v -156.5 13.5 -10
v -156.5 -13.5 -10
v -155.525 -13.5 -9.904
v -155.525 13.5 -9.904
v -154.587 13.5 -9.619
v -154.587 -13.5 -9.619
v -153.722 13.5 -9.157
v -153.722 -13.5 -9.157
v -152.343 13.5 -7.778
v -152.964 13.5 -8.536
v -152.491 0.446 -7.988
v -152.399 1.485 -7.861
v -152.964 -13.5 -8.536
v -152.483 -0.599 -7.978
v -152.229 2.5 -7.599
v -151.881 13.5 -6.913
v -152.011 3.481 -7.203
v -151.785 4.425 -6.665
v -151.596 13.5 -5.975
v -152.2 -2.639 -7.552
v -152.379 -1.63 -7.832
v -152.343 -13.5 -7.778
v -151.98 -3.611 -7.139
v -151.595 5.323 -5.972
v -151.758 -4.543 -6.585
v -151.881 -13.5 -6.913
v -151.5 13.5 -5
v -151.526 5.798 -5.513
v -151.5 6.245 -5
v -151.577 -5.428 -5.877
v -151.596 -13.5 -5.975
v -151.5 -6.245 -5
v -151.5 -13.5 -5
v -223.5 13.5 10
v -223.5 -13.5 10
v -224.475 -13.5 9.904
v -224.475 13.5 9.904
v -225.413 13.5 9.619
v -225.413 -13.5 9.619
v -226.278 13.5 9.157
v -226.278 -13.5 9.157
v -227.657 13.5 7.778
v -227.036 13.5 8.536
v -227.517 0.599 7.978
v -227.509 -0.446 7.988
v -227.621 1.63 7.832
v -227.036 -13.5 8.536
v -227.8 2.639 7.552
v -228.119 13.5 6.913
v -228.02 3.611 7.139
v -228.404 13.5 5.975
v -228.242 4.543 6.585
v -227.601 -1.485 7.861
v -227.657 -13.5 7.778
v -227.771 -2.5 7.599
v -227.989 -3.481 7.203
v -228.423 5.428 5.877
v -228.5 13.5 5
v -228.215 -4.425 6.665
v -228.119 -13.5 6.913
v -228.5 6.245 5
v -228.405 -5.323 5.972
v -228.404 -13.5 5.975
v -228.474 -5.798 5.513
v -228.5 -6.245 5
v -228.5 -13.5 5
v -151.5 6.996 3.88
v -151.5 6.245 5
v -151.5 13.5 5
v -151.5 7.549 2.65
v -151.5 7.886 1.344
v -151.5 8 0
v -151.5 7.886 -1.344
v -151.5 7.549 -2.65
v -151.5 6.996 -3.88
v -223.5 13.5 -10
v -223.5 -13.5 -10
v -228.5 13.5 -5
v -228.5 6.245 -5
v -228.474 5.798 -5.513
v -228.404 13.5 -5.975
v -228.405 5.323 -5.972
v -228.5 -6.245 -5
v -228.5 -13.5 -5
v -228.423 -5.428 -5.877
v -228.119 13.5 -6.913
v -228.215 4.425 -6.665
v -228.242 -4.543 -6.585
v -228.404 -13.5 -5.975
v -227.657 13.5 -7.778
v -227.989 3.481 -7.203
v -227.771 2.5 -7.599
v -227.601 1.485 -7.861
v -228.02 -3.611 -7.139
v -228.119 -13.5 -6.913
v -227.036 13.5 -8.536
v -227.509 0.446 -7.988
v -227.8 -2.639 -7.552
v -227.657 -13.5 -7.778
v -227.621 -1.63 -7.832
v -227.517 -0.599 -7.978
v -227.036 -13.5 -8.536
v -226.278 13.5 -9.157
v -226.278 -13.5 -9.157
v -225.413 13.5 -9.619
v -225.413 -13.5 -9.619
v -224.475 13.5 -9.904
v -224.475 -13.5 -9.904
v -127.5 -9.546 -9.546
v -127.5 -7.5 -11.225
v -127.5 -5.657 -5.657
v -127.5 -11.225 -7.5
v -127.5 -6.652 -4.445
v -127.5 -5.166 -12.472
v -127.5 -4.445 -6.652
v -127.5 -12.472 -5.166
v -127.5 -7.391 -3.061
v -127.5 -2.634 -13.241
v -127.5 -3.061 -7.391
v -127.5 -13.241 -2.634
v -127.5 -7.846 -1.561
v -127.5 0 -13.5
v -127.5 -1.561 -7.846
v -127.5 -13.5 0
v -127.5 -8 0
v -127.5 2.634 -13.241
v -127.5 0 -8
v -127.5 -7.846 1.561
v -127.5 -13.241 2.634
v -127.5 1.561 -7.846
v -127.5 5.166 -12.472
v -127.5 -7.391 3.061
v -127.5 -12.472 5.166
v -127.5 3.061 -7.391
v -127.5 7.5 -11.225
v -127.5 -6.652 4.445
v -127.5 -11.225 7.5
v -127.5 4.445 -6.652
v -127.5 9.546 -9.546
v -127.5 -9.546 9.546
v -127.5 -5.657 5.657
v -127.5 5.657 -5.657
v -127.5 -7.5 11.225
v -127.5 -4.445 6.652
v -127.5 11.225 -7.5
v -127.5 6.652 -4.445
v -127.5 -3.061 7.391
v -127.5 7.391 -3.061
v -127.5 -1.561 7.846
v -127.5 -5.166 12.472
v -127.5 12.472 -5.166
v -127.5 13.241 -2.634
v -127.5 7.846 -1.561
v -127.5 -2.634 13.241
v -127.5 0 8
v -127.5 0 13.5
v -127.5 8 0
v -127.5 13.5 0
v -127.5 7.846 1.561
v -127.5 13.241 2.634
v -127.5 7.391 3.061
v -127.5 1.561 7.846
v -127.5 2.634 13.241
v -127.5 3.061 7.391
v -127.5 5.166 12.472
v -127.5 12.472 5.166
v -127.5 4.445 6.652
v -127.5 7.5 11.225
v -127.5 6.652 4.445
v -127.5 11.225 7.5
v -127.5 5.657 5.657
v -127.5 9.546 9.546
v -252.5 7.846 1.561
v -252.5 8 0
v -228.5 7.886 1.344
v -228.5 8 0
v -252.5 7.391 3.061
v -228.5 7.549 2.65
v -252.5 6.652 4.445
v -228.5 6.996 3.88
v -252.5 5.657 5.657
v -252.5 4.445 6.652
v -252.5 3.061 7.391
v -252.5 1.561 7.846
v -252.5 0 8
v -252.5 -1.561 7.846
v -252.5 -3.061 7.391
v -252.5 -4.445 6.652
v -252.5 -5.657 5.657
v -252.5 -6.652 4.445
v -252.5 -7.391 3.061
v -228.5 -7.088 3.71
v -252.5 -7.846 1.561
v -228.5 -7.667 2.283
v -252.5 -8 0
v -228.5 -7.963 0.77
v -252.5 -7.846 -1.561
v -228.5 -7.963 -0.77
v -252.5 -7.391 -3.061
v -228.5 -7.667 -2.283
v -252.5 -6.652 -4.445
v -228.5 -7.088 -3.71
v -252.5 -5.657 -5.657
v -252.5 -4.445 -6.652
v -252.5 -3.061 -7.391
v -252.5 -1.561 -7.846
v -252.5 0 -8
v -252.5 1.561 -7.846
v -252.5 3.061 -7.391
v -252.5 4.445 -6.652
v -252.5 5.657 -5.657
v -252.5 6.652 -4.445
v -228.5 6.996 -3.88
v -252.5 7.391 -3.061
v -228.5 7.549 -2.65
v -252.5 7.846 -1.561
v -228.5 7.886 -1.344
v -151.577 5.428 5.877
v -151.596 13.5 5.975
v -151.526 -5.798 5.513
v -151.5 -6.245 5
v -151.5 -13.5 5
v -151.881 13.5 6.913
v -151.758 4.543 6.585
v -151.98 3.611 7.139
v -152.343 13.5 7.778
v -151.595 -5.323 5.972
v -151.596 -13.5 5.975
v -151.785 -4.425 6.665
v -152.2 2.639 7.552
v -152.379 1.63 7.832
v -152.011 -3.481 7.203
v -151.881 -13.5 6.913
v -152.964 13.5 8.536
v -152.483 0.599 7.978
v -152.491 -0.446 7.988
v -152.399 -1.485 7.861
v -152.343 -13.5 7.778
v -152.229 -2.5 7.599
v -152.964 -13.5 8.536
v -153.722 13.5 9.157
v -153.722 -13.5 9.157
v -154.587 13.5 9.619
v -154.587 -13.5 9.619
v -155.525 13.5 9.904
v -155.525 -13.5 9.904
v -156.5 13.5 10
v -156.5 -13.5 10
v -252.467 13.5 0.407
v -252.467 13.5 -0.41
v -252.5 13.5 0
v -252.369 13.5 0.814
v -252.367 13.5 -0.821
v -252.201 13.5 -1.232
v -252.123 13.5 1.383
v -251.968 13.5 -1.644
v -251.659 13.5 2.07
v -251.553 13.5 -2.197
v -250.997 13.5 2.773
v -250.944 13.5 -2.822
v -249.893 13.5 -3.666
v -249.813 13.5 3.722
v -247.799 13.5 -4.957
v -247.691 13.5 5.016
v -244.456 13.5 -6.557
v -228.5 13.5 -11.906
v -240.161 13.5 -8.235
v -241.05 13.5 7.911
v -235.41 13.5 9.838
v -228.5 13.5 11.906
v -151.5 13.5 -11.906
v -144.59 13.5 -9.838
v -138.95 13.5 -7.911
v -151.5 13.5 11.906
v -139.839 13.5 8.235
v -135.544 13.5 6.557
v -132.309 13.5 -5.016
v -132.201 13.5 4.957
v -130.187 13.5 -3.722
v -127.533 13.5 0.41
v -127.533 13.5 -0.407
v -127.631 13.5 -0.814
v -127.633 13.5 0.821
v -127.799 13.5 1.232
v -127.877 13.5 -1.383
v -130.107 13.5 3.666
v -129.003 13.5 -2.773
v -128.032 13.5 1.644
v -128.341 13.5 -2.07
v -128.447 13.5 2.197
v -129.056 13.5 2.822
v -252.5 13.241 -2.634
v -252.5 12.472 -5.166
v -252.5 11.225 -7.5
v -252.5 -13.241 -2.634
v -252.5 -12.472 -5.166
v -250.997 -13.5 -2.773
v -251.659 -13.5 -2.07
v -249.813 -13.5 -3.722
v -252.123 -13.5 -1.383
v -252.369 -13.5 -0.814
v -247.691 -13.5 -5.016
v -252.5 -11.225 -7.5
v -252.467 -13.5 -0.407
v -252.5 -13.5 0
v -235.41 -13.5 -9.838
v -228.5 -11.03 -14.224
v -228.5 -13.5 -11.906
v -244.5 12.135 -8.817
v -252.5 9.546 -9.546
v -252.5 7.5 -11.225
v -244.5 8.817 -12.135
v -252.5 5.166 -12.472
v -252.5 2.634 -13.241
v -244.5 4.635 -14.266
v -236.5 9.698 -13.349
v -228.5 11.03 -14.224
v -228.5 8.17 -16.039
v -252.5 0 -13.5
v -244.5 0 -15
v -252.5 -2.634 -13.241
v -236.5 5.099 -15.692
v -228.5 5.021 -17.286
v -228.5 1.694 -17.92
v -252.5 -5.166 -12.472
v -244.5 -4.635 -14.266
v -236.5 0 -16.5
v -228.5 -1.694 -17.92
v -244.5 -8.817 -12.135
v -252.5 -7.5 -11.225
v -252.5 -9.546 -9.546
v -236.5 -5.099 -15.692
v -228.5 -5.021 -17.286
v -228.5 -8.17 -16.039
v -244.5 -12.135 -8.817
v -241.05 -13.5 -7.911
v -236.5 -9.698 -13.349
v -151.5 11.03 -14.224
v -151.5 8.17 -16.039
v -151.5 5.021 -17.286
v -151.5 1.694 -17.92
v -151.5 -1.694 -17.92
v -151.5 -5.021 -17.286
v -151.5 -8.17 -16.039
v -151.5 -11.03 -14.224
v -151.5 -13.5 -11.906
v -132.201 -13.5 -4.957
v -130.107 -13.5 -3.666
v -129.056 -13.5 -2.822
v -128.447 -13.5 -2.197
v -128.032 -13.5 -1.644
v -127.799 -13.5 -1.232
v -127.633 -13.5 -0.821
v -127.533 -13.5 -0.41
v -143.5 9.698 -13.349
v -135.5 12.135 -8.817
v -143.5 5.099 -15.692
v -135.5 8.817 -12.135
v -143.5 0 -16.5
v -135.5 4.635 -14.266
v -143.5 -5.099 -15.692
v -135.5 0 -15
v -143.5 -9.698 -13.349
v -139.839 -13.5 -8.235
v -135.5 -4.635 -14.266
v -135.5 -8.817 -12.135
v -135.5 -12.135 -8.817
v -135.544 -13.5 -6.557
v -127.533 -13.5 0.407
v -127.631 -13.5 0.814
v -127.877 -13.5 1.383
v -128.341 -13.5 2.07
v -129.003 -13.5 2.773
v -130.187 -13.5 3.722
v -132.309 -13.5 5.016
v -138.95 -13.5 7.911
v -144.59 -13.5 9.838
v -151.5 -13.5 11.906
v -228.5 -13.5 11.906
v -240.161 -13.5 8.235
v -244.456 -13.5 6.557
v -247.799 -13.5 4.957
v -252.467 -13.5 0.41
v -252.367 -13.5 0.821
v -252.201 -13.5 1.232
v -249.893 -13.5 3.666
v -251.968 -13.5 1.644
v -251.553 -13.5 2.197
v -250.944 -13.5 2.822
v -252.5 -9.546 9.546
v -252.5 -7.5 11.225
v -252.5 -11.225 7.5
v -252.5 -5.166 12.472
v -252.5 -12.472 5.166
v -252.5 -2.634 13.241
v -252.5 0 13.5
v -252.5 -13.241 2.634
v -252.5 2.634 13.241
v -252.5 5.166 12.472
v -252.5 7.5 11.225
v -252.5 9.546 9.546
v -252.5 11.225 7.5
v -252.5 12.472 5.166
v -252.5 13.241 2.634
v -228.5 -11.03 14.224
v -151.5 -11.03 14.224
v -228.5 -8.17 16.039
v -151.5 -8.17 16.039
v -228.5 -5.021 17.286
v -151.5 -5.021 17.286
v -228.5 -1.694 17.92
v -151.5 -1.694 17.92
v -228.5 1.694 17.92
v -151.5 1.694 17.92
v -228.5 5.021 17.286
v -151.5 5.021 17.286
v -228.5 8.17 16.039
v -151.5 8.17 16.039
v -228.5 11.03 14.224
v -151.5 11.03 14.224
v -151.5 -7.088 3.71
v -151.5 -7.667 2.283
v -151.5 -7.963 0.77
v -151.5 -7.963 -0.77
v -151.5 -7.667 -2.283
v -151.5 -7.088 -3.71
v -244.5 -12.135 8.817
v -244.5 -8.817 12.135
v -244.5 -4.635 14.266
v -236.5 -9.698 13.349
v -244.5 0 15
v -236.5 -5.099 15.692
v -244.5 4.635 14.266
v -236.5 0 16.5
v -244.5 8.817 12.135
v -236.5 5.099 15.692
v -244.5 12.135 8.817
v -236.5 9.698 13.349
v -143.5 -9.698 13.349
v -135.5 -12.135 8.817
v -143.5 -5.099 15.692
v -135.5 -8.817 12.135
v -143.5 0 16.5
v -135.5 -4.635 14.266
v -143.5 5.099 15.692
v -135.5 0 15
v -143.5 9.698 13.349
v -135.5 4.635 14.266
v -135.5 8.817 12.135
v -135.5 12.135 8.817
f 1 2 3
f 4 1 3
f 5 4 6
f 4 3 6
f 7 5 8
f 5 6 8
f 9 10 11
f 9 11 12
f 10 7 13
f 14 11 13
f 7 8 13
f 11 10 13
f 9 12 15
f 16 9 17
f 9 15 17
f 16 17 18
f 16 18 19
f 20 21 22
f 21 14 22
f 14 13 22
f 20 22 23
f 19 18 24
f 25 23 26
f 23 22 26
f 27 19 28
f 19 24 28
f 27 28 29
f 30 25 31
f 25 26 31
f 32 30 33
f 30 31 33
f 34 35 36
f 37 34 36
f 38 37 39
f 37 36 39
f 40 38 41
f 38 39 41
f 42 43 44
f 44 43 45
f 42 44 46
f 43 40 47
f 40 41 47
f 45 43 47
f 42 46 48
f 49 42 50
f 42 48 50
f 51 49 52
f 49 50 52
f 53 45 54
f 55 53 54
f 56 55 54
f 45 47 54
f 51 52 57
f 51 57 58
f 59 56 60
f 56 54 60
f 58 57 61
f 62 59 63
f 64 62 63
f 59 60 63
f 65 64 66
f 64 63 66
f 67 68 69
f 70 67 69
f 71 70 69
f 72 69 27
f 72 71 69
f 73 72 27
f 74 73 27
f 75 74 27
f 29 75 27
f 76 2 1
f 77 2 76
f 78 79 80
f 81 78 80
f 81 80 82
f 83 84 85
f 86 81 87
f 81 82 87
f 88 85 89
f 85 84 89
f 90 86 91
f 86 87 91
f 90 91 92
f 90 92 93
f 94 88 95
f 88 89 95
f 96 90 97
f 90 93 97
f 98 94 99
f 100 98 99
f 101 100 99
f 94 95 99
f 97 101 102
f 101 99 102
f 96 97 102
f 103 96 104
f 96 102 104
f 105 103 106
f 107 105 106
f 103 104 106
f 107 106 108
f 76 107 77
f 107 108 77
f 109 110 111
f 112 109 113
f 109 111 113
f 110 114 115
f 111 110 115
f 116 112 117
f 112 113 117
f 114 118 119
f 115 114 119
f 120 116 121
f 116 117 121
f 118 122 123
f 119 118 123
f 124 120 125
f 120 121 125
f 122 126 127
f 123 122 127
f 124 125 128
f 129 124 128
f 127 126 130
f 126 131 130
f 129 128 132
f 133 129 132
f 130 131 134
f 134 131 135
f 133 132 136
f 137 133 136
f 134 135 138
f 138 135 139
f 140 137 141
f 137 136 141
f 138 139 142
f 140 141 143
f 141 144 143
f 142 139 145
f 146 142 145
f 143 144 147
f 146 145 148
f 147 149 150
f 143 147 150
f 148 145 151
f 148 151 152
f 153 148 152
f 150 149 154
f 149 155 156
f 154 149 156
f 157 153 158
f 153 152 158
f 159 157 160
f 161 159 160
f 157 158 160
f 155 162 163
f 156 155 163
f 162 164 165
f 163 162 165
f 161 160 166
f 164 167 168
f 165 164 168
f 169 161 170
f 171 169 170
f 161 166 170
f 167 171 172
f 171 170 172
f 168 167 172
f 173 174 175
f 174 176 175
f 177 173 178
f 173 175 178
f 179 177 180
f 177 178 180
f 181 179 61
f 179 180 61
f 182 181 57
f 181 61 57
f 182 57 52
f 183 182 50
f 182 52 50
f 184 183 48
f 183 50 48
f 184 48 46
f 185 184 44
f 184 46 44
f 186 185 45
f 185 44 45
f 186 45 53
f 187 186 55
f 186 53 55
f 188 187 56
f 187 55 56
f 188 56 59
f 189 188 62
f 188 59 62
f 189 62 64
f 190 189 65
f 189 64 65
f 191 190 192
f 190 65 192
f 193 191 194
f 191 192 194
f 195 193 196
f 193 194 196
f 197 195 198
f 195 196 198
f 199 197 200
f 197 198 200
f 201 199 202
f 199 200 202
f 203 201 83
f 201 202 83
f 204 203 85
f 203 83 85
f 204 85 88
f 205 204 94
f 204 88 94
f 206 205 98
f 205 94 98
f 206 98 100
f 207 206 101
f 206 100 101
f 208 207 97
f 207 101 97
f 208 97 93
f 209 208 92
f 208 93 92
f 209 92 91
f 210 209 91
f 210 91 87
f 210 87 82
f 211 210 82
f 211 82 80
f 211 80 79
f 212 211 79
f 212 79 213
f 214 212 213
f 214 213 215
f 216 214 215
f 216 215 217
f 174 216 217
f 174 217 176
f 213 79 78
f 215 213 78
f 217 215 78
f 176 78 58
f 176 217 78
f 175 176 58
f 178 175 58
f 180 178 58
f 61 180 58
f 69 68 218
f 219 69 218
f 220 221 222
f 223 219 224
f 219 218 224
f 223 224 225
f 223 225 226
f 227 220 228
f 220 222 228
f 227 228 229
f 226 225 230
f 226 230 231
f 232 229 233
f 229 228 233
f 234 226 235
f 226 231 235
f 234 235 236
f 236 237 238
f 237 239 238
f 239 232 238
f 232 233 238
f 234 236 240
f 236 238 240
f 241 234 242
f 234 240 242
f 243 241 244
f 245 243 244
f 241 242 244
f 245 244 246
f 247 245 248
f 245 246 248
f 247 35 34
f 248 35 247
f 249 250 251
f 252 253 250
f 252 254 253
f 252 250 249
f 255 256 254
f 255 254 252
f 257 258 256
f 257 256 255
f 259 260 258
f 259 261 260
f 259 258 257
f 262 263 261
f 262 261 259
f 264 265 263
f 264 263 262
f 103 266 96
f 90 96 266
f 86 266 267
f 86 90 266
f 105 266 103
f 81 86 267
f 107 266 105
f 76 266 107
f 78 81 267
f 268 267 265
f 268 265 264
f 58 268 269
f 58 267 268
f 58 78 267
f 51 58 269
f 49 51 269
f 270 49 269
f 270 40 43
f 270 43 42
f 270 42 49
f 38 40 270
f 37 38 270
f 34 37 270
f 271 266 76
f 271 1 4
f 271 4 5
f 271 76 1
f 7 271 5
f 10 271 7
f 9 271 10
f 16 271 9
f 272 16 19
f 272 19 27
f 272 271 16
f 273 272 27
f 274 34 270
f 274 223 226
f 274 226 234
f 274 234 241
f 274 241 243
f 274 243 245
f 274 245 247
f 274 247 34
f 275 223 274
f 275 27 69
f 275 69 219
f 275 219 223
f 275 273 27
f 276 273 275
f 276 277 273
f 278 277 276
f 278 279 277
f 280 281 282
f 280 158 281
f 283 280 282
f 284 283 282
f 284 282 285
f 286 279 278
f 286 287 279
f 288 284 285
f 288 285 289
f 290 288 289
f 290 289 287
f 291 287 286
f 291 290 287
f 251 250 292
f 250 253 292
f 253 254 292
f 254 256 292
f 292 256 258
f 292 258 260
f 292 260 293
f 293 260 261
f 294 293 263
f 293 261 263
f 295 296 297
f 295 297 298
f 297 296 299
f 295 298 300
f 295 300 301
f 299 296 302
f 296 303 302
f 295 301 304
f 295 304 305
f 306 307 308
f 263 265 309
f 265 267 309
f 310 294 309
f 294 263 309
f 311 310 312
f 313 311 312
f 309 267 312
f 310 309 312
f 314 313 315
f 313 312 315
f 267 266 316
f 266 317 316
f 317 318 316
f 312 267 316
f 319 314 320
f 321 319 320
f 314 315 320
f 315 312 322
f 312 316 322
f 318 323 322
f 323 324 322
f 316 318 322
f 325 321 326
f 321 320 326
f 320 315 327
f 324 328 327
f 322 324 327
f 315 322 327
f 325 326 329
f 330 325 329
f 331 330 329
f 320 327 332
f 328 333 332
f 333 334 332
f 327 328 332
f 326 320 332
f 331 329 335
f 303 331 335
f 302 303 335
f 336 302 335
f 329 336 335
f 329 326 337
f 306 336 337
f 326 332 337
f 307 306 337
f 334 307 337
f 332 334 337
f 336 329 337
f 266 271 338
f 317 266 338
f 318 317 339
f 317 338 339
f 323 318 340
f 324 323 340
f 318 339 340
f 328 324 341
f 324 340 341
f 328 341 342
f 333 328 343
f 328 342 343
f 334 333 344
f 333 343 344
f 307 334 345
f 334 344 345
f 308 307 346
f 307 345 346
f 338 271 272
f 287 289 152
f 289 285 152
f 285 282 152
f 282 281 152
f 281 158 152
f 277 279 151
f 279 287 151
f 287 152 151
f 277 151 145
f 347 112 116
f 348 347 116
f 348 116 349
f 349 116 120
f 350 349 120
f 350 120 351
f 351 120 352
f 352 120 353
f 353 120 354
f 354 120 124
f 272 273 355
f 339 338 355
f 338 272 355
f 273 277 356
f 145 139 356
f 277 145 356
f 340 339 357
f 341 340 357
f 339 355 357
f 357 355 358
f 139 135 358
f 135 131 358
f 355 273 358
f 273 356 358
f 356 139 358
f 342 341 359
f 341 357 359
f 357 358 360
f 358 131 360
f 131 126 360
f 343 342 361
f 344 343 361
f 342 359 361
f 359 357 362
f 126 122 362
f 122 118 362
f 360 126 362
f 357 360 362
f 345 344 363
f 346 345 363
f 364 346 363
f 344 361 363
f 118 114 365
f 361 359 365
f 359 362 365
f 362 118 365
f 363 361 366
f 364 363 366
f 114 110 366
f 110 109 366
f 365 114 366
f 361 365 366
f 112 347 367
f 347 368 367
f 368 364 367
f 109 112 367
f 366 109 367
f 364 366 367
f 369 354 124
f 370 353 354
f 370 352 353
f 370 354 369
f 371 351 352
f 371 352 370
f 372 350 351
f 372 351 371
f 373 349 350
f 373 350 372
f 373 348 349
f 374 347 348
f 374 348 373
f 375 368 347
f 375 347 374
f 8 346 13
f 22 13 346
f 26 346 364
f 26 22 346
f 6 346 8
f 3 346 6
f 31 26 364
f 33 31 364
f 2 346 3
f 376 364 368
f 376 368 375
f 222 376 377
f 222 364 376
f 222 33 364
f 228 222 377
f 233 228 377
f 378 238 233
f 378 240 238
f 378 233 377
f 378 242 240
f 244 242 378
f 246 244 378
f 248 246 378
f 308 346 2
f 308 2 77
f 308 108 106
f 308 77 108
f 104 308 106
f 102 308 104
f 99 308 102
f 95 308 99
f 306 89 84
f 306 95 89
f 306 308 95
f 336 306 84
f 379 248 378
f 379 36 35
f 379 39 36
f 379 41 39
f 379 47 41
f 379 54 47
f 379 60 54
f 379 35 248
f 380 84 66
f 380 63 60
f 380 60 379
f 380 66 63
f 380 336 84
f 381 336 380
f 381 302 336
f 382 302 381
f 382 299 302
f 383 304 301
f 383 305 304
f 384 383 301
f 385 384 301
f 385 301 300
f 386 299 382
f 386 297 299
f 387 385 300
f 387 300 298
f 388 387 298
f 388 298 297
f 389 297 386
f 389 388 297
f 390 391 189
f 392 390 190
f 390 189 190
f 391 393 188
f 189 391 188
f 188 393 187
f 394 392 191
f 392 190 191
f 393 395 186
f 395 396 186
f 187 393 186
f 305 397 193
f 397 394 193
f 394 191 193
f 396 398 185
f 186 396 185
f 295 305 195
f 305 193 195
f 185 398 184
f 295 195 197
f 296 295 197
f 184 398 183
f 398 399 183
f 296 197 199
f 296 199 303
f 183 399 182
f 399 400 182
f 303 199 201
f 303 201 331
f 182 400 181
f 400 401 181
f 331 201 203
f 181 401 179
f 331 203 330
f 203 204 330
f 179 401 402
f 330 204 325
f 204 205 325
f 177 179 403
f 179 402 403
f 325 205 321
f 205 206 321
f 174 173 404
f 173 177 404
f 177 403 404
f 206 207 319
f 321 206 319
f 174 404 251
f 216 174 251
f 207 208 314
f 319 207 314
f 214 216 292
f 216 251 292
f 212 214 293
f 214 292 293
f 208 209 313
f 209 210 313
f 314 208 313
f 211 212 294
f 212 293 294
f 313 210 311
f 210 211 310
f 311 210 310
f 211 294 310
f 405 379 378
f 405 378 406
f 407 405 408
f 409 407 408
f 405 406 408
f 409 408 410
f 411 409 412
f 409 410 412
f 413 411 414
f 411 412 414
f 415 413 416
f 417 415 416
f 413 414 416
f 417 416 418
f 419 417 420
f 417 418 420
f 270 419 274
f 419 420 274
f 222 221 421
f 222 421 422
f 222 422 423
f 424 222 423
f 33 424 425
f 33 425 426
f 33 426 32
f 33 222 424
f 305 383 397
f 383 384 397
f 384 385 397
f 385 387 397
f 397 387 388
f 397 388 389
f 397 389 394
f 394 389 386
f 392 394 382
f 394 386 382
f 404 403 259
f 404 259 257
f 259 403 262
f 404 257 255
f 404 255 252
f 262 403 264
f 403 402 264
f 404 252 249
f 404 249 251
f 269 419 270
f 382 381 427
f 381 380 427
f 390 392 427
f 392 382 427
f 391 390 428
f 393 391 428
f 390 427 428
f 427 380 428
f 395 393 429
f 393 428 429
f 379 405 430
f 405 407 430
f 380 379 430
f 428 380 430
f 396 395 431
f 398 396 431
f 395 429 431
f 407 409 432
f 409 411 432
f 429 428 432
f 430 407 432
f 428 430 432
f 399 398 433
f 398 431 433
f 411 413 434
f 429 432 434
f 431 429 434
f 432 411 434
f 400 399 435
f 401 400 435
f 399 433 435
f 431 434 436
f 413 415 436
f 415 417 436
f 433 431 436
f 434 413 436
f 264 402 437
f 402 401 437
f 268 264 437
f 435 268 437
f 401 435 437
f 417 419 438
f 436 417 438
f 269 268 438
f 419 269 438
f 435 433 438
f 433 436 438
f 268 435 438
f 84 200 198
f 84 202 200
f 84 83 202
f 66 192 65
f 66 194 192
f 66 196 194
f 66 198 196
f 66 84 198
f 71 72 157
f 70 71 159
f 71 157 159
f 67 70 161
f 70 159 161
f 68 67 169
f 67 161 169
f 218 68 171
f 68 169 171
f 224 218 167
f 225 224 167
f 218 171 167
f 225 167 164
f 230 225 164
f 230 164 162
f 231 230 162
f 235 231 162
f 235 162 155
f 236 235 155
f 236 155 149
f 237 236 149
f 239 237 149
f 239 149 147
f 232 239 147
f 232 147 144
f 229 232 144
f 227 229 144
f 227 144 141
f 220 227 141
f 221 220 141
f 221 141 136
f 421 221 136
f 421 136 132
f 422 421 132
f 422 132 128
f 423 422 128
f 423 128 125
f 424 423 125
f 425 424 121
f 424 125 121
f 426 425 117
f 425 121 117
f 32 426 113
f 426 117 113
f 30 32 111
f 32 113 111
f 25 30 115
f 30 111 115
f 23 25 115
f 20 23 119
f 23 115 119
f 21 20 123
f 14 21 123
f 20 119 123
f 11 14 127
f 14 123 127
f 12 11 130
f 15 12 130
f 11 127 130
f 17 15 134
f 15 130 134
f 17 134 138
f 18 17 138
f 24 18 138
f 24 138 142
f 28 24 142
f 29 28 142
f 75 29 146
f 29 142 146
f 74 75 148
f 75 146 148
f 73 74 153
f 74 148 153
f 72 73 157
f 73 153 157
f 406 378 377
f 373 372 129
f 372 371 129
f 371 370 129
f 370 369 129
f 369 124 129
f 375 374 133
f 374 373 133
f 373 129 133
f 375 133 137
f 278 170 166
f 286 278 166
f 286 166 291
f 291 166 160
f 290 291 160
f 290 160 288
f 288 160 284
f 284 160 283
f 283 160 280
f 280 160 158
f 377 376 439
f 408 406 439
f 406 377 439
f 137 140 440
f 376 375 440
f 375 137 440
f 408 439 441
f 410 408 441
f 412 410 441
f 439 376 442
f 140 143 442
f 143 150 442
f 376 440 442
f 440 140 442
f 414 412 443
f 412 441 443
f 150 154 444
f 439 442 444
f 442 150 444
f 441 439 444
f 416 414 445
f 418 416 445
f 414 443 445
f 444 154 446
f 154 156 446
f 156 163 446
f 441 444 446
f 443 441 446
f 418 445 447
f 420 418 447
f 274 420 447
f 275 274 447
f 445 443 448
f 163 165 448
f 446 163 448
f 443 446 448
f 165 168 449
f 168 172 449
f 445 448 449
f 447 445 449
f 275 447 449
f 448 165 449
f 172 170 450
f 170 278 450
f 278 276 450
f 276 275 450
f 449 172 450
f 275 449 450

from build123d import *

# Parameters (mm, degrees)
SKETCH022_R      = 8
EXTRUDE011_DEPTH = 150
EXTRUDE010_DEPTH = 30
SKETCH020_W      = 15
SKETCH020_H      = 79.05159
SKETCH020_H_2    = 80
EXTRUDE009_DEPTH = 150


with BuildPart() as extrude011:
    # Sketch022 → Extrude011 (new body, symmetric)
    with BuildSketch(Plane.YZ):
        Circle(SKETCH022_R)
    extrude(amount=EXTRUDE011_DEPTH, both=True)


with BuildPart() as extrude010:
    # Sketch021 → Extrude010 (new body, symmetric)
    with BuildSketch(Plane.XZ):
        with BuildLine():
            Line((38.5, 5), (38.5, -5))
            ThreePointArc((33.5, -10), (37.035534, -8.535534), (38.5, -5))
            Line((33.5, -10), (-33.5, -10))
            ThreePointArc((-38.5, -5), (-37.035534, -8.535534), (-33.5, -10))
            Line((-38.5, -5), (-38.5, 5))
            ThreePointArc((-33.5, 10), (-37.035534, 8.535534), (-38.5, 5))
            Line((-33.5, 10), (33.5, 10))
            ThreePointArc((38.5, 5), (37.035534, 8.535534), (33.5, 10))
        make_face()
    extrude(amount=EXTRUDE010_DEPTH, both=True)


with BuildPart() as extrude009:
    # Sketch020 → Extrude009 (new body, symmetric)
    with BuildSketch(Plane.YZ):
        with Locations((-21, 0.159191)):
            Rectangle(SKETCH020_W, SKETCH020_H)
        with Locations((21, -0.315014)):
            Rectangle(SKETCH020_W, SKETCH020_H_2)
    extrude(amount=EXTRUDE009_DEPTH, both=True)


with BuildPart() as turnbackle001:
    # Sketch019 → Revolve001 (revolve)
    with BuildSketch(Plane.XZ):
        Polygon((-62.5, 0), (-62.5, 13.5), (-38.5, 18), (38.5, 18), (62.5, 13.5), (62.5, 0), align=None)
    revolve(axis=Axis((-62.5, 0, 0), (-1, 0, 0)))

    # Cut009: cut Extrude009
    add(extrude009.part, mode=Mode.SUBTRACT)

    # Cut010: cut Extrude010
    add(extrude010.part, mode=Mode.SUBTRACT)

    # Cut011: cut Extrude011
    add(extrude011.part, mode=Mode.SUBTRACT)


with BuildPart() as turnbackle001_1:
    # Cut011 placement: moved
    add(turnbackle001.part.moved(Location((-190, 0, 0))))


solid = turnbackle001_1.part
